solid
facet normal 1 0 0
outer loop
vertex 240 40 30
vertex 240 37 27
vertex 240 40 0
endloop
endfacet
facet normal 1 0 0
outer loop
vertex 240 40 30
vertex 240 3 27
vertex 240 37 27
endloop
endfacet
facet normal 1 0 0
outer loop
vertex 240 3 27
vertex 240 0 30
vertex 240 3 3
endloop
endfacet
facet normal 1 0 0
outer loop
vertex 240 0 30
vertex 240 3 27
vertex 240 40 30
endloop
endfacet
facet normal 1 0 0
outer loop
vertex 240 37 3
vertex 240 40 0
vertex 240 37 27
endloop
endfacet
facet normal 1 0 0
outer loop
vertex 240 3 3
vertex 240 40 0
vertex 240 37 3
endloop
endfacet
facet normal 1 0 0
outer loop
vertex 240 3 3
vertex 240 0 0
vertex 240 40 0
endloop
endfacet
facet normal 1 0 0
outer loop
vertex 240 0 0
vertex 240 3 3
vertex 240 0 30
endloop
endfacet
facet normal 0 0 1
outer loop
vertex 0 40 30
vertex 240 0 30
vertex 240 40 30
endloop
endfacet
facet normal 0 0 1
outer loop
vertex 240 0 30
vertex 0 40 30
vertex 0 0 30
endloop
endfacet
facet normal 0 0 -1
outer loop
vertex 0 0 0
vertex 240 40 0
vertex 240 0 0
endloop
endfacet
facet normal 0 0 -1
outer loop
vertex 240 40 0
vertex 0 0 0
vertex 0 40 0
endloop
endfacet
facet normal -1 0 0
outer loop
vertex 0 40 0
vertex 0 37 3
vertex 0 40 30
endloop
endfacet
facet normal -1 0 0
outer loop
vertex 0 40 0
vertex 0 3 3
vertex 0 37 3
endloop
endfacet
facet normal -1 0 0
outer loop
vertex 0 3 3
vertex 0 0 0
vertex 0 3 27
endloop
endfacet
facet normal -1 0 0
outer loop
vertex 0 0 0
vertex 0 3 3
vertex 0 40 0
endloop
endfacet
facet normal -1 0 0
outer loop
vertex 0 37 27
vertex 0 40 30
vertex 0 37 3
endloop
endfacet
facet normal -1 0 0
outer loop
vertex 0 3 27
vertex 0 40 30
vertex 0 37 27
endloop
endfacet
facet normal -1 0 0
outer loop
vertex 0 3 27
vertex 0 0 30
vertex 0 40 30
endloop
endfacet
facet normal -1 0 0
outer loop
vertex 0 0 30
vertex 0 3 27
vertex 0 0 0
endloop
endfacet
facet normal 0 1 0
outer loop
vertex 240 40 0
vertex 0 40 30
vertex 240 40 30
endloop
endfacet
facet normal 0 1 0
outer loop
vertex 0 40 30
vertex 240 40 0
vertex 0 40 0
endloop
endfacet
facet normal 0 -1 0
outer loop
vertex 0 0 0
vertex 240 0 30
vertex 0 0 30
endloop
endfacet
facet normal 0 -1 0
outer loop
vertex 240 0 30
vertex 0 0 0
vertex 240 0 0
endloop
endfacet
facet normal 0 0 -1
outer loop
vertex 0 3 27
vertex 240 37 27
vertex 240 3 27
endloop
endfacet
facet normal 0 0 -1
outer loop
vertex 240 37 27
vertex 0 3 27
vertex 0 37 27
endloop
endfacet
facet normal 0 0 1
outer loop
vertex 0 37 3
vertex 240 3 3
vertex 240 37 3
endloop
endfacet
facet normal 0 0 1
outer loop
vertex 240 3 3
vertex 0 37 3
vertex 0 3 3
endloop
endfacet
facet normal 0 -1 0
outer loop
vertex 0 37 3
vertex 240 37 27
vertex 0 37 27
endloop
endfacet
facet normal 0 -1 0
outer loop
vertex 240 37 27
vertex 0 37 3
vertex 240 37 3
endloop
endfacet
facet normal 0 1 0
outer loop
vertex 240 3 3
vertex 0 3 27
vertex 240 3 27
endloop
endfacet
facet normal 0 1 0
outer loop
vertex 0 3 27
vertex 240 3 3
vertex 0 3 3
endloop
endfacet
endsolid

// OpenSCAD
$fn = 32;

// ----------------------------------------------------------------------
// Box beam: 200-250 mm hollow beam
// ----------------------------------------------------------------------

// --- parameters (mm) ---
beam_l = 240;             // beam length, X
beam_w = 40;              // beam width, Y
beam_h = 30;              // beam height, Z
wall = 3;                 // wall thickness

difference() {
  cube([beam_l, beam_w, beam_h]);
  translate([-1, wall, wall])
    cube([beam_l + 2, beam_w - 2 * wall, beam_h - 2 * wall]);
}
